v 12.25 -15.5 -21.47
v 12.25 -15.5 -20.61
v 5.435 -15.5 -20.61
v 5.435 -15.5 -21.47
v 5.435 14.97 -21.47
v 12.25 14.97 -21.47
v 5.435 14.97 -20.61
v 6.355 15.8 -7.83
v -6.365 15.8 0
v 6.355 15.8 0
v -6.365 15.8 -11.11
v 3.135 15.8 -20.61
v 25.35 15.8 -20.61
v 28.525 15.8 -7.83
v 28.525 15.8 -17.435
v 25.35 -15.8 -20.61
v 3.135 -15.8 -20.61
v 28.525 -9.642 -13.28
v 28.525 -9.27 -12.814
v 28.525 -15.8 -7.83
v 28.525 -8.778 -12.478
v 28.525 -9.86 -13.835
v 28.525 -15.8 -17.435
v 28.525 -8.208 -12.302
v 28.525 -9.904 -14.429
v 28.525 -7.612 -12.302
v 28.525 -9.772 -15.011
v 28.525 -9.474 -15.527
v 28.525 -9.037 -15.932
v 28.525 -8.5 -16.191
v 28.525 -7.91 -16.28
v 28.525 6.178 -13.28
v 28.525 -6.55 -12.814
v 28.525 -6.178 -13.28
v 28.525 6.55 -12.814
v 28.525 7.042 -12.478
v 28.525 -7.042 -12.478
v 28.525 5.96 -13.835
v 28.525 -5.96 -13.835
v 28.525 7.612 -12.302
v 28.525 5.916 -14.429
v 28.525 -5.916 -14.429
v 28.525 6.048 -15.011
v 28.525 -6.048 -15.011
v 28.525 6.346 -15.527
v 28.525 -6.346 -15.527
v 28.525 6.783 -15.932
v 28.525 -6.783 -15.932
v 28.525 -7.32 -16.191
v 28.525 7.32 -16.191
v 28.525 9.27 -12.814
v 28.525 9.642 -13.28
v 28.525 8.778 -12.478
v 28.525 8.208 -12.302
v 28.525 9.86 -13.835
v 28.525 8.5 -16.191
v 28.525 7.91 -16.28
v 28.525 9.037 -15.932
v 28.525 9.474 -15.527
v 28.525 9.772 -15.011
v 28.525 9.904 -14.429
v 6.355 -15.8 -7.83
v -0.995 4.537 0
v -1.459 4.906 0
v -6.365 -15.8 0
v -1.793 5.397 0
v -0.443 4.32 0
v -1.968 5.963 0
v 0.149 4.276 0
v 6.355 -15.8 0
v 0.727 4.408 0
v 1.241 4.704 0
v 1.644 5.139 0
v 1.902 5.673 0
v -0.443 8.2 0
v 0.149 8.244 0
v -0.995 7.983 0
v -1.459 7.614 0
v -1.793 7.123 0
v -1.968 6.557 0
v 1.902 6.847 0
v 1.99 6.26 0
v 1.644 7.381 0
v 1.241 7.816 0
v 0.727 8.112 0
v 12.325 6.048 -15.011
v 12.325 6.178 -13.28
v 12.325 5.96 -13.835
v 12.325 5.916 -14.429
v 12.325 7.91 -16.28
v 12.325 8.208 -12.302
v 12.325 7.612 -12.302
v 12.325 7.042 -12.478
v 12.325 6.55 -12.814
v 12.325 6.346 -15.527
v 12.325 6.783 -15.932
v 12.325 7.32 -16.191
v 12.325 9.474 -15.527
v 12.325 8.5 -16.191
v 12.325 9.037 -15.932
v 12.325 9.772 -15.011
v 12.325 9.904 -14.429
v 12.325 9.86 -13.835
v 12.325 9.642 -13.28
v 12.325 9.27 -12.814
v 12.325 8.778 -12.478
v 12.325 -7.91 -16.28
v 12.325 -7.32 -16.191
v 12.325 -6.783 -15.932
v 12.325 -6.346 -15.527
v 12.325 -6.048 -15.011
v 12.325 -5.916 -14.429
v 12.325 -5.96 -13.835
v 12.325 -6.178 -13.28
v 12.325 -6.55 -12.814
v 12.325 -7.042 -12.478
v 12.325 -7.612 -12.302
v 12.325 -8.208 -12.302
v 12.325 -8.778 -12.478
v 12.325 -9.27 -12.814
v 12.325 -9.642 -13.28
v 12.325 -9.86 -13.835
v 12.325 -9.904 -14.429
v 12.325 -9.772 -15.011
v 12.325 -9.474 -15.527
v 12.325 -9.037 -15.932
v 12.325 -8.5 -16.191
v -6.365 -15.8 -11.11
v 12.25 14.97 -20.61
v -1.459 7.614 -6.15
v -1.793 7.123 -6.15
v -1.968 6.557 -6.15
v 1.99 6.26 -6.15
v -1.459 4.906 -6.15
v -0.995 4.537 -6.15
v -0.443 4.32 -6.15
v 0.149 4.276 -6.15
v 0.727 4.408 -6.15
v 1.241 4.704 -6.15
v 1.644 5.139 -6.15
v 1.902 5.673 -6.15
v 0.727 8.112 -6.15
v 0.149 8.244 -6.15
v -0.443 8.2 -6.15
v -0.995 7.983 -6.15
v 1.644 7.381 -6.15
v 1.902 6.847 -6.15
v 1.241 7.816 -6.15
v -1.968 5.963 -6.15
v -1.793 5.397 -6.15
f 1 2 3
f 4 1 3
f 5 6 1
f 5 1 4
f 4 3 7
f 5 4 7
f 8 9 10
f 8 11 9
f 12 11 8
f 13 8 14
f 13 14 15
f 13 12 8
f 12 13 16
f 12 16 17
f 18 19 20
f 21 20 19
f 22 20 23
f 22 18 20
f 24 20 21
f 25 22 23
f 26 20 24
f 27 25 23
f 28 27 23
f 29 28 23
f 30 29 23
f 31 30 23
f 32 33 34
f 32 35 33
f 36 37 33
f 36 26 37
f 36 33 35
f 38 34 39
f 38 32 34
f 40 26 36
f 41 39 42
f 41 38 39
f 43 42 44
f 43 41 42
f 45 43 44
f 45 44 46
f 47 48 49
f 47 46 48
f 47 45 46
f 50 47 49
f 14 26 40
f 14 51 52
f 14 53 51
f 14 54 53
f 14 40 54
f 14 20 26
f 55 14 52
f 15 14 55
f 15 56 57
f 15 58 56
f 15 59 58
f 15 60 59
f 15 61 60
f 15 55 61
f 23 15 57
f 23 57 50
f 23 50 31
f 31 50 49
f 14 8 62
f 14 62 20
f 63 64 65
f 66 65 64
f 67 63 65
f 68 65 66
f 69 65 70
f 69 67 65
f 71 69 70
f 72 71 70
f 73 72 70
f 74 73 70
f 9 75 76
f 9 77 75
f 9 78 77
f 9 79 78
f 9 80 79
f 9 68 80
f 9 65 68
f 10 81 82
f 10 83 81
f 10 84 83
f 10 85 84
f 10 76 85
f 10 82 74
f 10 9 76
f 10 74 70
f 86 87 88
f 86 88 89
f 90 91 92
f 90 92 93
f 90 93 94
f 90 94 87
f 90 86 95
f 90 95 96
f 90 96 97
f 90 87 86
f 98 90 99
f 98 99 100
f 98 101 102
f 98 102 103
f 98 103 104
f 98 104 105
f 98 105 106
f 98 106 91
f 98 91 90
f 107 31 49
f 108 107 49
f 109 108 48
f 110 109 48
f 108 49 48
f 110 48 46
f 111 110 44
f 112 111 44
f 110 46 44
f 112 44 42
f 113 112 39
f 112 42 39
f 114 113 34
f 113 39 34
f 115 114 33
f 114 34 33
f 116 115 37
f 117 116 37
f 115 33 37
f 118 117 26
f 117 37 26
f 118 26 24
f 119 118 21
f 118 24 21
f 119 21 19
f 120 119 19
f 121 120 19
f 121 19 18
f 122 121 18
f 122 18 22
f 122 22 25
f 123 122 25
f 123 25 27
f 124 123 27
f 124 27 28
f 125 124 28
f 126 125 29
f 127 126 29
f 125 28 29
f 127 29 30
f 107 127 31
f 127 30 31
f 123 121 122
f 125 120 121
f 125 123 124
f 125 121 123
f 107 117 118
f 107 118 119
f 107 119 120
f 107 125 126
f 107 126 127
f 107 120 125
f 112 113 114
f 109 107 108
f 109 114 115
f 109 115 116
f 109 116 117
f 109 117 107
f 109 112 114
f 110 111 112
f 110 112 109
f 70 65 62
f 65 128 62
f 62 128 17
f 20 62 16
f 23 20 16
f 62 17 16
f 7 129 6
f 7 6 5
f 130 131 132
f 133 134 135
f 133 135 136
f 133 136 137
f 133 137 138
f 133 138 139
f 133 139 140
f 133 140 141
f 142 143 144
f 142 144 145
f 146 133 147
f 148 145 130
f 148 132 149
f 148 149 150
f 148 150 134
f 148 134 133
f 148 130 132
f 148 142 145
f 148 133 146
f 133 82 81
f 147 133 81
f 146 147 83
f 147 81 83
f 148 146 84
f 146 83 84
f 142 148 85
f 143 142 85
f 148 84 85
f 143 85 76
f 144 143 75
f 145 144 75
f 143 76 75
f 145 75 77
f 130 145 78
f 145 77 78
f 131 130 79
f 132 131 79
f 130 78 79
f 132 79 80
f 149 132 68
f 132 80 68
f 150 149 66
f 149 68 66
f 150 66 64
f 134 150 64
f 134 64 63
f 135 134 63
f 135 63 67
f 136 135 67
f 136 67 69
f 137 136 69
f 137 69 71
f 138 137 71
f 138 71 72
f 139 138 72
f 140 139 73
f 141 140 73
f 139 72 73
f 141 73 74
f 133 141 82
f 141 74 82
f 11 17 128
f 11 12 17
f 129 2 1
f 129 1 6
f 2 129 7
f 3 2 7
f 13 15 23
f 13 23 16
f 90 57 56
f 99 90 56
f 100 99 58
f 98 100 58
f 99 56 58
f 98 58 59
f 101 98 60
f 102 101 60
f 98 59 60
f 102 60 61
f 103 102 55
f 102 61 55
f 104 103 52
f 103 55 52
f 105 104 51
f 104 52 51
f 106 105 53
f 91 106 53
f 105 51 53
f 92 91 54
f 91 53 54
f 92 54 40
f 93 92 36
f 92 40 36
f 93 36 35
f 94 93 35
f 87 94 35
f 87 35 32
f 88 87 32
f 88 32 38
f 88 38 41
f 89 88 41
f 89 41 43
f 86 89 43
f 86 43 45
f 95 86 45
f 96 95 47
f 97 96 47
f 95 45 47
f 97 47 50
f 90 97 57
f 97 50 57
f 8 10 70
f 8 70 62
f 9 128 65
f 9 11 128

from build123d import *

# Parameters (mm, degrees)
BOSS_EXTRUDE1_DEPTH      = 15.8
BOSS_EXTRUDE1_DEPTH_BACK = 15.8
SKETCH2_R                = 1.99
CUT_EXTRUDE1_DEPTH       = 6.15
SKETCH3_R                = 2
CUT_EXTRUDE2_DEPTH       = 16.2
SKETCH4_W                = 6.815
SKETCH4_H                = 30.47
BOSS_EXTRUDE2_DEPTH      = 0.86


with BuildPart() as part:
    # Sketch1 → Boss-Extrude1 (new, two sides: drawn at the far end of the back side and taken through both)
    with BuildSketch(Plane(origin=(0, 0, 0), x_dir=(1, 0, 0), z_dir=(0, 1, 0)).offset(-BOSS_EXTRUDE1_DEPTH_BACK)):
        Polygon((-6.365, 0), (6.355, 0), (6.355, 7.83), (28.525, 7.83), (28.525, 17.435), (25.35, 20.61), (3.135, 20.61), (-6.365, 11.11), align=None)
    extrude(amount=BOSS_EXTRUDE1_DEPTH + BOSS_EXTRUDE1_DEPTH_BACK)

    # Sketch2 → Cut-Extrude1 (cut)
    with BuildSketch(Plane.XY):
        with Locations((0, 6.26)):
            Circle(SKETCH2_R)
    extrude(amount=-CUT_EXTRUDE1_DEPTH, mode=Mode.SUBTRACT)

    # Sketch3 → Cut-Extrude2 (cut)
    with BuildSketch(Plane(origin=(28.525, 0, 0), x_dir=(0, 0, -1), z_dir=(1, 0, 0))):
        with Locations((14.28, -7.91)):
            Circle(SKETCH3_R)
        with Locations((14.28, 7.91)):
            Circle(SKETCH3_R)
    extrude(amount=-CUT_EXTRUDE2_DEPTH, mode=Mode.SUBTRACT)


with BuildPart() as body_2:
    # Sketch4 → Boss-Extrude2 (new body)
    with BuildSketch(Plane(origin=(0, 0, -20.61), x_dir=(-1, 0, 0), z_dir=(0, 0, -1))):
        with Locations((-8.8425, -0.265)):
            Rectangle(SKETCH4_W, SKETCH4_H)
    extrude(amount=BOSS_EXTRUDE2_DEPTH)


solid = Compound([part.part, body_2.part])
